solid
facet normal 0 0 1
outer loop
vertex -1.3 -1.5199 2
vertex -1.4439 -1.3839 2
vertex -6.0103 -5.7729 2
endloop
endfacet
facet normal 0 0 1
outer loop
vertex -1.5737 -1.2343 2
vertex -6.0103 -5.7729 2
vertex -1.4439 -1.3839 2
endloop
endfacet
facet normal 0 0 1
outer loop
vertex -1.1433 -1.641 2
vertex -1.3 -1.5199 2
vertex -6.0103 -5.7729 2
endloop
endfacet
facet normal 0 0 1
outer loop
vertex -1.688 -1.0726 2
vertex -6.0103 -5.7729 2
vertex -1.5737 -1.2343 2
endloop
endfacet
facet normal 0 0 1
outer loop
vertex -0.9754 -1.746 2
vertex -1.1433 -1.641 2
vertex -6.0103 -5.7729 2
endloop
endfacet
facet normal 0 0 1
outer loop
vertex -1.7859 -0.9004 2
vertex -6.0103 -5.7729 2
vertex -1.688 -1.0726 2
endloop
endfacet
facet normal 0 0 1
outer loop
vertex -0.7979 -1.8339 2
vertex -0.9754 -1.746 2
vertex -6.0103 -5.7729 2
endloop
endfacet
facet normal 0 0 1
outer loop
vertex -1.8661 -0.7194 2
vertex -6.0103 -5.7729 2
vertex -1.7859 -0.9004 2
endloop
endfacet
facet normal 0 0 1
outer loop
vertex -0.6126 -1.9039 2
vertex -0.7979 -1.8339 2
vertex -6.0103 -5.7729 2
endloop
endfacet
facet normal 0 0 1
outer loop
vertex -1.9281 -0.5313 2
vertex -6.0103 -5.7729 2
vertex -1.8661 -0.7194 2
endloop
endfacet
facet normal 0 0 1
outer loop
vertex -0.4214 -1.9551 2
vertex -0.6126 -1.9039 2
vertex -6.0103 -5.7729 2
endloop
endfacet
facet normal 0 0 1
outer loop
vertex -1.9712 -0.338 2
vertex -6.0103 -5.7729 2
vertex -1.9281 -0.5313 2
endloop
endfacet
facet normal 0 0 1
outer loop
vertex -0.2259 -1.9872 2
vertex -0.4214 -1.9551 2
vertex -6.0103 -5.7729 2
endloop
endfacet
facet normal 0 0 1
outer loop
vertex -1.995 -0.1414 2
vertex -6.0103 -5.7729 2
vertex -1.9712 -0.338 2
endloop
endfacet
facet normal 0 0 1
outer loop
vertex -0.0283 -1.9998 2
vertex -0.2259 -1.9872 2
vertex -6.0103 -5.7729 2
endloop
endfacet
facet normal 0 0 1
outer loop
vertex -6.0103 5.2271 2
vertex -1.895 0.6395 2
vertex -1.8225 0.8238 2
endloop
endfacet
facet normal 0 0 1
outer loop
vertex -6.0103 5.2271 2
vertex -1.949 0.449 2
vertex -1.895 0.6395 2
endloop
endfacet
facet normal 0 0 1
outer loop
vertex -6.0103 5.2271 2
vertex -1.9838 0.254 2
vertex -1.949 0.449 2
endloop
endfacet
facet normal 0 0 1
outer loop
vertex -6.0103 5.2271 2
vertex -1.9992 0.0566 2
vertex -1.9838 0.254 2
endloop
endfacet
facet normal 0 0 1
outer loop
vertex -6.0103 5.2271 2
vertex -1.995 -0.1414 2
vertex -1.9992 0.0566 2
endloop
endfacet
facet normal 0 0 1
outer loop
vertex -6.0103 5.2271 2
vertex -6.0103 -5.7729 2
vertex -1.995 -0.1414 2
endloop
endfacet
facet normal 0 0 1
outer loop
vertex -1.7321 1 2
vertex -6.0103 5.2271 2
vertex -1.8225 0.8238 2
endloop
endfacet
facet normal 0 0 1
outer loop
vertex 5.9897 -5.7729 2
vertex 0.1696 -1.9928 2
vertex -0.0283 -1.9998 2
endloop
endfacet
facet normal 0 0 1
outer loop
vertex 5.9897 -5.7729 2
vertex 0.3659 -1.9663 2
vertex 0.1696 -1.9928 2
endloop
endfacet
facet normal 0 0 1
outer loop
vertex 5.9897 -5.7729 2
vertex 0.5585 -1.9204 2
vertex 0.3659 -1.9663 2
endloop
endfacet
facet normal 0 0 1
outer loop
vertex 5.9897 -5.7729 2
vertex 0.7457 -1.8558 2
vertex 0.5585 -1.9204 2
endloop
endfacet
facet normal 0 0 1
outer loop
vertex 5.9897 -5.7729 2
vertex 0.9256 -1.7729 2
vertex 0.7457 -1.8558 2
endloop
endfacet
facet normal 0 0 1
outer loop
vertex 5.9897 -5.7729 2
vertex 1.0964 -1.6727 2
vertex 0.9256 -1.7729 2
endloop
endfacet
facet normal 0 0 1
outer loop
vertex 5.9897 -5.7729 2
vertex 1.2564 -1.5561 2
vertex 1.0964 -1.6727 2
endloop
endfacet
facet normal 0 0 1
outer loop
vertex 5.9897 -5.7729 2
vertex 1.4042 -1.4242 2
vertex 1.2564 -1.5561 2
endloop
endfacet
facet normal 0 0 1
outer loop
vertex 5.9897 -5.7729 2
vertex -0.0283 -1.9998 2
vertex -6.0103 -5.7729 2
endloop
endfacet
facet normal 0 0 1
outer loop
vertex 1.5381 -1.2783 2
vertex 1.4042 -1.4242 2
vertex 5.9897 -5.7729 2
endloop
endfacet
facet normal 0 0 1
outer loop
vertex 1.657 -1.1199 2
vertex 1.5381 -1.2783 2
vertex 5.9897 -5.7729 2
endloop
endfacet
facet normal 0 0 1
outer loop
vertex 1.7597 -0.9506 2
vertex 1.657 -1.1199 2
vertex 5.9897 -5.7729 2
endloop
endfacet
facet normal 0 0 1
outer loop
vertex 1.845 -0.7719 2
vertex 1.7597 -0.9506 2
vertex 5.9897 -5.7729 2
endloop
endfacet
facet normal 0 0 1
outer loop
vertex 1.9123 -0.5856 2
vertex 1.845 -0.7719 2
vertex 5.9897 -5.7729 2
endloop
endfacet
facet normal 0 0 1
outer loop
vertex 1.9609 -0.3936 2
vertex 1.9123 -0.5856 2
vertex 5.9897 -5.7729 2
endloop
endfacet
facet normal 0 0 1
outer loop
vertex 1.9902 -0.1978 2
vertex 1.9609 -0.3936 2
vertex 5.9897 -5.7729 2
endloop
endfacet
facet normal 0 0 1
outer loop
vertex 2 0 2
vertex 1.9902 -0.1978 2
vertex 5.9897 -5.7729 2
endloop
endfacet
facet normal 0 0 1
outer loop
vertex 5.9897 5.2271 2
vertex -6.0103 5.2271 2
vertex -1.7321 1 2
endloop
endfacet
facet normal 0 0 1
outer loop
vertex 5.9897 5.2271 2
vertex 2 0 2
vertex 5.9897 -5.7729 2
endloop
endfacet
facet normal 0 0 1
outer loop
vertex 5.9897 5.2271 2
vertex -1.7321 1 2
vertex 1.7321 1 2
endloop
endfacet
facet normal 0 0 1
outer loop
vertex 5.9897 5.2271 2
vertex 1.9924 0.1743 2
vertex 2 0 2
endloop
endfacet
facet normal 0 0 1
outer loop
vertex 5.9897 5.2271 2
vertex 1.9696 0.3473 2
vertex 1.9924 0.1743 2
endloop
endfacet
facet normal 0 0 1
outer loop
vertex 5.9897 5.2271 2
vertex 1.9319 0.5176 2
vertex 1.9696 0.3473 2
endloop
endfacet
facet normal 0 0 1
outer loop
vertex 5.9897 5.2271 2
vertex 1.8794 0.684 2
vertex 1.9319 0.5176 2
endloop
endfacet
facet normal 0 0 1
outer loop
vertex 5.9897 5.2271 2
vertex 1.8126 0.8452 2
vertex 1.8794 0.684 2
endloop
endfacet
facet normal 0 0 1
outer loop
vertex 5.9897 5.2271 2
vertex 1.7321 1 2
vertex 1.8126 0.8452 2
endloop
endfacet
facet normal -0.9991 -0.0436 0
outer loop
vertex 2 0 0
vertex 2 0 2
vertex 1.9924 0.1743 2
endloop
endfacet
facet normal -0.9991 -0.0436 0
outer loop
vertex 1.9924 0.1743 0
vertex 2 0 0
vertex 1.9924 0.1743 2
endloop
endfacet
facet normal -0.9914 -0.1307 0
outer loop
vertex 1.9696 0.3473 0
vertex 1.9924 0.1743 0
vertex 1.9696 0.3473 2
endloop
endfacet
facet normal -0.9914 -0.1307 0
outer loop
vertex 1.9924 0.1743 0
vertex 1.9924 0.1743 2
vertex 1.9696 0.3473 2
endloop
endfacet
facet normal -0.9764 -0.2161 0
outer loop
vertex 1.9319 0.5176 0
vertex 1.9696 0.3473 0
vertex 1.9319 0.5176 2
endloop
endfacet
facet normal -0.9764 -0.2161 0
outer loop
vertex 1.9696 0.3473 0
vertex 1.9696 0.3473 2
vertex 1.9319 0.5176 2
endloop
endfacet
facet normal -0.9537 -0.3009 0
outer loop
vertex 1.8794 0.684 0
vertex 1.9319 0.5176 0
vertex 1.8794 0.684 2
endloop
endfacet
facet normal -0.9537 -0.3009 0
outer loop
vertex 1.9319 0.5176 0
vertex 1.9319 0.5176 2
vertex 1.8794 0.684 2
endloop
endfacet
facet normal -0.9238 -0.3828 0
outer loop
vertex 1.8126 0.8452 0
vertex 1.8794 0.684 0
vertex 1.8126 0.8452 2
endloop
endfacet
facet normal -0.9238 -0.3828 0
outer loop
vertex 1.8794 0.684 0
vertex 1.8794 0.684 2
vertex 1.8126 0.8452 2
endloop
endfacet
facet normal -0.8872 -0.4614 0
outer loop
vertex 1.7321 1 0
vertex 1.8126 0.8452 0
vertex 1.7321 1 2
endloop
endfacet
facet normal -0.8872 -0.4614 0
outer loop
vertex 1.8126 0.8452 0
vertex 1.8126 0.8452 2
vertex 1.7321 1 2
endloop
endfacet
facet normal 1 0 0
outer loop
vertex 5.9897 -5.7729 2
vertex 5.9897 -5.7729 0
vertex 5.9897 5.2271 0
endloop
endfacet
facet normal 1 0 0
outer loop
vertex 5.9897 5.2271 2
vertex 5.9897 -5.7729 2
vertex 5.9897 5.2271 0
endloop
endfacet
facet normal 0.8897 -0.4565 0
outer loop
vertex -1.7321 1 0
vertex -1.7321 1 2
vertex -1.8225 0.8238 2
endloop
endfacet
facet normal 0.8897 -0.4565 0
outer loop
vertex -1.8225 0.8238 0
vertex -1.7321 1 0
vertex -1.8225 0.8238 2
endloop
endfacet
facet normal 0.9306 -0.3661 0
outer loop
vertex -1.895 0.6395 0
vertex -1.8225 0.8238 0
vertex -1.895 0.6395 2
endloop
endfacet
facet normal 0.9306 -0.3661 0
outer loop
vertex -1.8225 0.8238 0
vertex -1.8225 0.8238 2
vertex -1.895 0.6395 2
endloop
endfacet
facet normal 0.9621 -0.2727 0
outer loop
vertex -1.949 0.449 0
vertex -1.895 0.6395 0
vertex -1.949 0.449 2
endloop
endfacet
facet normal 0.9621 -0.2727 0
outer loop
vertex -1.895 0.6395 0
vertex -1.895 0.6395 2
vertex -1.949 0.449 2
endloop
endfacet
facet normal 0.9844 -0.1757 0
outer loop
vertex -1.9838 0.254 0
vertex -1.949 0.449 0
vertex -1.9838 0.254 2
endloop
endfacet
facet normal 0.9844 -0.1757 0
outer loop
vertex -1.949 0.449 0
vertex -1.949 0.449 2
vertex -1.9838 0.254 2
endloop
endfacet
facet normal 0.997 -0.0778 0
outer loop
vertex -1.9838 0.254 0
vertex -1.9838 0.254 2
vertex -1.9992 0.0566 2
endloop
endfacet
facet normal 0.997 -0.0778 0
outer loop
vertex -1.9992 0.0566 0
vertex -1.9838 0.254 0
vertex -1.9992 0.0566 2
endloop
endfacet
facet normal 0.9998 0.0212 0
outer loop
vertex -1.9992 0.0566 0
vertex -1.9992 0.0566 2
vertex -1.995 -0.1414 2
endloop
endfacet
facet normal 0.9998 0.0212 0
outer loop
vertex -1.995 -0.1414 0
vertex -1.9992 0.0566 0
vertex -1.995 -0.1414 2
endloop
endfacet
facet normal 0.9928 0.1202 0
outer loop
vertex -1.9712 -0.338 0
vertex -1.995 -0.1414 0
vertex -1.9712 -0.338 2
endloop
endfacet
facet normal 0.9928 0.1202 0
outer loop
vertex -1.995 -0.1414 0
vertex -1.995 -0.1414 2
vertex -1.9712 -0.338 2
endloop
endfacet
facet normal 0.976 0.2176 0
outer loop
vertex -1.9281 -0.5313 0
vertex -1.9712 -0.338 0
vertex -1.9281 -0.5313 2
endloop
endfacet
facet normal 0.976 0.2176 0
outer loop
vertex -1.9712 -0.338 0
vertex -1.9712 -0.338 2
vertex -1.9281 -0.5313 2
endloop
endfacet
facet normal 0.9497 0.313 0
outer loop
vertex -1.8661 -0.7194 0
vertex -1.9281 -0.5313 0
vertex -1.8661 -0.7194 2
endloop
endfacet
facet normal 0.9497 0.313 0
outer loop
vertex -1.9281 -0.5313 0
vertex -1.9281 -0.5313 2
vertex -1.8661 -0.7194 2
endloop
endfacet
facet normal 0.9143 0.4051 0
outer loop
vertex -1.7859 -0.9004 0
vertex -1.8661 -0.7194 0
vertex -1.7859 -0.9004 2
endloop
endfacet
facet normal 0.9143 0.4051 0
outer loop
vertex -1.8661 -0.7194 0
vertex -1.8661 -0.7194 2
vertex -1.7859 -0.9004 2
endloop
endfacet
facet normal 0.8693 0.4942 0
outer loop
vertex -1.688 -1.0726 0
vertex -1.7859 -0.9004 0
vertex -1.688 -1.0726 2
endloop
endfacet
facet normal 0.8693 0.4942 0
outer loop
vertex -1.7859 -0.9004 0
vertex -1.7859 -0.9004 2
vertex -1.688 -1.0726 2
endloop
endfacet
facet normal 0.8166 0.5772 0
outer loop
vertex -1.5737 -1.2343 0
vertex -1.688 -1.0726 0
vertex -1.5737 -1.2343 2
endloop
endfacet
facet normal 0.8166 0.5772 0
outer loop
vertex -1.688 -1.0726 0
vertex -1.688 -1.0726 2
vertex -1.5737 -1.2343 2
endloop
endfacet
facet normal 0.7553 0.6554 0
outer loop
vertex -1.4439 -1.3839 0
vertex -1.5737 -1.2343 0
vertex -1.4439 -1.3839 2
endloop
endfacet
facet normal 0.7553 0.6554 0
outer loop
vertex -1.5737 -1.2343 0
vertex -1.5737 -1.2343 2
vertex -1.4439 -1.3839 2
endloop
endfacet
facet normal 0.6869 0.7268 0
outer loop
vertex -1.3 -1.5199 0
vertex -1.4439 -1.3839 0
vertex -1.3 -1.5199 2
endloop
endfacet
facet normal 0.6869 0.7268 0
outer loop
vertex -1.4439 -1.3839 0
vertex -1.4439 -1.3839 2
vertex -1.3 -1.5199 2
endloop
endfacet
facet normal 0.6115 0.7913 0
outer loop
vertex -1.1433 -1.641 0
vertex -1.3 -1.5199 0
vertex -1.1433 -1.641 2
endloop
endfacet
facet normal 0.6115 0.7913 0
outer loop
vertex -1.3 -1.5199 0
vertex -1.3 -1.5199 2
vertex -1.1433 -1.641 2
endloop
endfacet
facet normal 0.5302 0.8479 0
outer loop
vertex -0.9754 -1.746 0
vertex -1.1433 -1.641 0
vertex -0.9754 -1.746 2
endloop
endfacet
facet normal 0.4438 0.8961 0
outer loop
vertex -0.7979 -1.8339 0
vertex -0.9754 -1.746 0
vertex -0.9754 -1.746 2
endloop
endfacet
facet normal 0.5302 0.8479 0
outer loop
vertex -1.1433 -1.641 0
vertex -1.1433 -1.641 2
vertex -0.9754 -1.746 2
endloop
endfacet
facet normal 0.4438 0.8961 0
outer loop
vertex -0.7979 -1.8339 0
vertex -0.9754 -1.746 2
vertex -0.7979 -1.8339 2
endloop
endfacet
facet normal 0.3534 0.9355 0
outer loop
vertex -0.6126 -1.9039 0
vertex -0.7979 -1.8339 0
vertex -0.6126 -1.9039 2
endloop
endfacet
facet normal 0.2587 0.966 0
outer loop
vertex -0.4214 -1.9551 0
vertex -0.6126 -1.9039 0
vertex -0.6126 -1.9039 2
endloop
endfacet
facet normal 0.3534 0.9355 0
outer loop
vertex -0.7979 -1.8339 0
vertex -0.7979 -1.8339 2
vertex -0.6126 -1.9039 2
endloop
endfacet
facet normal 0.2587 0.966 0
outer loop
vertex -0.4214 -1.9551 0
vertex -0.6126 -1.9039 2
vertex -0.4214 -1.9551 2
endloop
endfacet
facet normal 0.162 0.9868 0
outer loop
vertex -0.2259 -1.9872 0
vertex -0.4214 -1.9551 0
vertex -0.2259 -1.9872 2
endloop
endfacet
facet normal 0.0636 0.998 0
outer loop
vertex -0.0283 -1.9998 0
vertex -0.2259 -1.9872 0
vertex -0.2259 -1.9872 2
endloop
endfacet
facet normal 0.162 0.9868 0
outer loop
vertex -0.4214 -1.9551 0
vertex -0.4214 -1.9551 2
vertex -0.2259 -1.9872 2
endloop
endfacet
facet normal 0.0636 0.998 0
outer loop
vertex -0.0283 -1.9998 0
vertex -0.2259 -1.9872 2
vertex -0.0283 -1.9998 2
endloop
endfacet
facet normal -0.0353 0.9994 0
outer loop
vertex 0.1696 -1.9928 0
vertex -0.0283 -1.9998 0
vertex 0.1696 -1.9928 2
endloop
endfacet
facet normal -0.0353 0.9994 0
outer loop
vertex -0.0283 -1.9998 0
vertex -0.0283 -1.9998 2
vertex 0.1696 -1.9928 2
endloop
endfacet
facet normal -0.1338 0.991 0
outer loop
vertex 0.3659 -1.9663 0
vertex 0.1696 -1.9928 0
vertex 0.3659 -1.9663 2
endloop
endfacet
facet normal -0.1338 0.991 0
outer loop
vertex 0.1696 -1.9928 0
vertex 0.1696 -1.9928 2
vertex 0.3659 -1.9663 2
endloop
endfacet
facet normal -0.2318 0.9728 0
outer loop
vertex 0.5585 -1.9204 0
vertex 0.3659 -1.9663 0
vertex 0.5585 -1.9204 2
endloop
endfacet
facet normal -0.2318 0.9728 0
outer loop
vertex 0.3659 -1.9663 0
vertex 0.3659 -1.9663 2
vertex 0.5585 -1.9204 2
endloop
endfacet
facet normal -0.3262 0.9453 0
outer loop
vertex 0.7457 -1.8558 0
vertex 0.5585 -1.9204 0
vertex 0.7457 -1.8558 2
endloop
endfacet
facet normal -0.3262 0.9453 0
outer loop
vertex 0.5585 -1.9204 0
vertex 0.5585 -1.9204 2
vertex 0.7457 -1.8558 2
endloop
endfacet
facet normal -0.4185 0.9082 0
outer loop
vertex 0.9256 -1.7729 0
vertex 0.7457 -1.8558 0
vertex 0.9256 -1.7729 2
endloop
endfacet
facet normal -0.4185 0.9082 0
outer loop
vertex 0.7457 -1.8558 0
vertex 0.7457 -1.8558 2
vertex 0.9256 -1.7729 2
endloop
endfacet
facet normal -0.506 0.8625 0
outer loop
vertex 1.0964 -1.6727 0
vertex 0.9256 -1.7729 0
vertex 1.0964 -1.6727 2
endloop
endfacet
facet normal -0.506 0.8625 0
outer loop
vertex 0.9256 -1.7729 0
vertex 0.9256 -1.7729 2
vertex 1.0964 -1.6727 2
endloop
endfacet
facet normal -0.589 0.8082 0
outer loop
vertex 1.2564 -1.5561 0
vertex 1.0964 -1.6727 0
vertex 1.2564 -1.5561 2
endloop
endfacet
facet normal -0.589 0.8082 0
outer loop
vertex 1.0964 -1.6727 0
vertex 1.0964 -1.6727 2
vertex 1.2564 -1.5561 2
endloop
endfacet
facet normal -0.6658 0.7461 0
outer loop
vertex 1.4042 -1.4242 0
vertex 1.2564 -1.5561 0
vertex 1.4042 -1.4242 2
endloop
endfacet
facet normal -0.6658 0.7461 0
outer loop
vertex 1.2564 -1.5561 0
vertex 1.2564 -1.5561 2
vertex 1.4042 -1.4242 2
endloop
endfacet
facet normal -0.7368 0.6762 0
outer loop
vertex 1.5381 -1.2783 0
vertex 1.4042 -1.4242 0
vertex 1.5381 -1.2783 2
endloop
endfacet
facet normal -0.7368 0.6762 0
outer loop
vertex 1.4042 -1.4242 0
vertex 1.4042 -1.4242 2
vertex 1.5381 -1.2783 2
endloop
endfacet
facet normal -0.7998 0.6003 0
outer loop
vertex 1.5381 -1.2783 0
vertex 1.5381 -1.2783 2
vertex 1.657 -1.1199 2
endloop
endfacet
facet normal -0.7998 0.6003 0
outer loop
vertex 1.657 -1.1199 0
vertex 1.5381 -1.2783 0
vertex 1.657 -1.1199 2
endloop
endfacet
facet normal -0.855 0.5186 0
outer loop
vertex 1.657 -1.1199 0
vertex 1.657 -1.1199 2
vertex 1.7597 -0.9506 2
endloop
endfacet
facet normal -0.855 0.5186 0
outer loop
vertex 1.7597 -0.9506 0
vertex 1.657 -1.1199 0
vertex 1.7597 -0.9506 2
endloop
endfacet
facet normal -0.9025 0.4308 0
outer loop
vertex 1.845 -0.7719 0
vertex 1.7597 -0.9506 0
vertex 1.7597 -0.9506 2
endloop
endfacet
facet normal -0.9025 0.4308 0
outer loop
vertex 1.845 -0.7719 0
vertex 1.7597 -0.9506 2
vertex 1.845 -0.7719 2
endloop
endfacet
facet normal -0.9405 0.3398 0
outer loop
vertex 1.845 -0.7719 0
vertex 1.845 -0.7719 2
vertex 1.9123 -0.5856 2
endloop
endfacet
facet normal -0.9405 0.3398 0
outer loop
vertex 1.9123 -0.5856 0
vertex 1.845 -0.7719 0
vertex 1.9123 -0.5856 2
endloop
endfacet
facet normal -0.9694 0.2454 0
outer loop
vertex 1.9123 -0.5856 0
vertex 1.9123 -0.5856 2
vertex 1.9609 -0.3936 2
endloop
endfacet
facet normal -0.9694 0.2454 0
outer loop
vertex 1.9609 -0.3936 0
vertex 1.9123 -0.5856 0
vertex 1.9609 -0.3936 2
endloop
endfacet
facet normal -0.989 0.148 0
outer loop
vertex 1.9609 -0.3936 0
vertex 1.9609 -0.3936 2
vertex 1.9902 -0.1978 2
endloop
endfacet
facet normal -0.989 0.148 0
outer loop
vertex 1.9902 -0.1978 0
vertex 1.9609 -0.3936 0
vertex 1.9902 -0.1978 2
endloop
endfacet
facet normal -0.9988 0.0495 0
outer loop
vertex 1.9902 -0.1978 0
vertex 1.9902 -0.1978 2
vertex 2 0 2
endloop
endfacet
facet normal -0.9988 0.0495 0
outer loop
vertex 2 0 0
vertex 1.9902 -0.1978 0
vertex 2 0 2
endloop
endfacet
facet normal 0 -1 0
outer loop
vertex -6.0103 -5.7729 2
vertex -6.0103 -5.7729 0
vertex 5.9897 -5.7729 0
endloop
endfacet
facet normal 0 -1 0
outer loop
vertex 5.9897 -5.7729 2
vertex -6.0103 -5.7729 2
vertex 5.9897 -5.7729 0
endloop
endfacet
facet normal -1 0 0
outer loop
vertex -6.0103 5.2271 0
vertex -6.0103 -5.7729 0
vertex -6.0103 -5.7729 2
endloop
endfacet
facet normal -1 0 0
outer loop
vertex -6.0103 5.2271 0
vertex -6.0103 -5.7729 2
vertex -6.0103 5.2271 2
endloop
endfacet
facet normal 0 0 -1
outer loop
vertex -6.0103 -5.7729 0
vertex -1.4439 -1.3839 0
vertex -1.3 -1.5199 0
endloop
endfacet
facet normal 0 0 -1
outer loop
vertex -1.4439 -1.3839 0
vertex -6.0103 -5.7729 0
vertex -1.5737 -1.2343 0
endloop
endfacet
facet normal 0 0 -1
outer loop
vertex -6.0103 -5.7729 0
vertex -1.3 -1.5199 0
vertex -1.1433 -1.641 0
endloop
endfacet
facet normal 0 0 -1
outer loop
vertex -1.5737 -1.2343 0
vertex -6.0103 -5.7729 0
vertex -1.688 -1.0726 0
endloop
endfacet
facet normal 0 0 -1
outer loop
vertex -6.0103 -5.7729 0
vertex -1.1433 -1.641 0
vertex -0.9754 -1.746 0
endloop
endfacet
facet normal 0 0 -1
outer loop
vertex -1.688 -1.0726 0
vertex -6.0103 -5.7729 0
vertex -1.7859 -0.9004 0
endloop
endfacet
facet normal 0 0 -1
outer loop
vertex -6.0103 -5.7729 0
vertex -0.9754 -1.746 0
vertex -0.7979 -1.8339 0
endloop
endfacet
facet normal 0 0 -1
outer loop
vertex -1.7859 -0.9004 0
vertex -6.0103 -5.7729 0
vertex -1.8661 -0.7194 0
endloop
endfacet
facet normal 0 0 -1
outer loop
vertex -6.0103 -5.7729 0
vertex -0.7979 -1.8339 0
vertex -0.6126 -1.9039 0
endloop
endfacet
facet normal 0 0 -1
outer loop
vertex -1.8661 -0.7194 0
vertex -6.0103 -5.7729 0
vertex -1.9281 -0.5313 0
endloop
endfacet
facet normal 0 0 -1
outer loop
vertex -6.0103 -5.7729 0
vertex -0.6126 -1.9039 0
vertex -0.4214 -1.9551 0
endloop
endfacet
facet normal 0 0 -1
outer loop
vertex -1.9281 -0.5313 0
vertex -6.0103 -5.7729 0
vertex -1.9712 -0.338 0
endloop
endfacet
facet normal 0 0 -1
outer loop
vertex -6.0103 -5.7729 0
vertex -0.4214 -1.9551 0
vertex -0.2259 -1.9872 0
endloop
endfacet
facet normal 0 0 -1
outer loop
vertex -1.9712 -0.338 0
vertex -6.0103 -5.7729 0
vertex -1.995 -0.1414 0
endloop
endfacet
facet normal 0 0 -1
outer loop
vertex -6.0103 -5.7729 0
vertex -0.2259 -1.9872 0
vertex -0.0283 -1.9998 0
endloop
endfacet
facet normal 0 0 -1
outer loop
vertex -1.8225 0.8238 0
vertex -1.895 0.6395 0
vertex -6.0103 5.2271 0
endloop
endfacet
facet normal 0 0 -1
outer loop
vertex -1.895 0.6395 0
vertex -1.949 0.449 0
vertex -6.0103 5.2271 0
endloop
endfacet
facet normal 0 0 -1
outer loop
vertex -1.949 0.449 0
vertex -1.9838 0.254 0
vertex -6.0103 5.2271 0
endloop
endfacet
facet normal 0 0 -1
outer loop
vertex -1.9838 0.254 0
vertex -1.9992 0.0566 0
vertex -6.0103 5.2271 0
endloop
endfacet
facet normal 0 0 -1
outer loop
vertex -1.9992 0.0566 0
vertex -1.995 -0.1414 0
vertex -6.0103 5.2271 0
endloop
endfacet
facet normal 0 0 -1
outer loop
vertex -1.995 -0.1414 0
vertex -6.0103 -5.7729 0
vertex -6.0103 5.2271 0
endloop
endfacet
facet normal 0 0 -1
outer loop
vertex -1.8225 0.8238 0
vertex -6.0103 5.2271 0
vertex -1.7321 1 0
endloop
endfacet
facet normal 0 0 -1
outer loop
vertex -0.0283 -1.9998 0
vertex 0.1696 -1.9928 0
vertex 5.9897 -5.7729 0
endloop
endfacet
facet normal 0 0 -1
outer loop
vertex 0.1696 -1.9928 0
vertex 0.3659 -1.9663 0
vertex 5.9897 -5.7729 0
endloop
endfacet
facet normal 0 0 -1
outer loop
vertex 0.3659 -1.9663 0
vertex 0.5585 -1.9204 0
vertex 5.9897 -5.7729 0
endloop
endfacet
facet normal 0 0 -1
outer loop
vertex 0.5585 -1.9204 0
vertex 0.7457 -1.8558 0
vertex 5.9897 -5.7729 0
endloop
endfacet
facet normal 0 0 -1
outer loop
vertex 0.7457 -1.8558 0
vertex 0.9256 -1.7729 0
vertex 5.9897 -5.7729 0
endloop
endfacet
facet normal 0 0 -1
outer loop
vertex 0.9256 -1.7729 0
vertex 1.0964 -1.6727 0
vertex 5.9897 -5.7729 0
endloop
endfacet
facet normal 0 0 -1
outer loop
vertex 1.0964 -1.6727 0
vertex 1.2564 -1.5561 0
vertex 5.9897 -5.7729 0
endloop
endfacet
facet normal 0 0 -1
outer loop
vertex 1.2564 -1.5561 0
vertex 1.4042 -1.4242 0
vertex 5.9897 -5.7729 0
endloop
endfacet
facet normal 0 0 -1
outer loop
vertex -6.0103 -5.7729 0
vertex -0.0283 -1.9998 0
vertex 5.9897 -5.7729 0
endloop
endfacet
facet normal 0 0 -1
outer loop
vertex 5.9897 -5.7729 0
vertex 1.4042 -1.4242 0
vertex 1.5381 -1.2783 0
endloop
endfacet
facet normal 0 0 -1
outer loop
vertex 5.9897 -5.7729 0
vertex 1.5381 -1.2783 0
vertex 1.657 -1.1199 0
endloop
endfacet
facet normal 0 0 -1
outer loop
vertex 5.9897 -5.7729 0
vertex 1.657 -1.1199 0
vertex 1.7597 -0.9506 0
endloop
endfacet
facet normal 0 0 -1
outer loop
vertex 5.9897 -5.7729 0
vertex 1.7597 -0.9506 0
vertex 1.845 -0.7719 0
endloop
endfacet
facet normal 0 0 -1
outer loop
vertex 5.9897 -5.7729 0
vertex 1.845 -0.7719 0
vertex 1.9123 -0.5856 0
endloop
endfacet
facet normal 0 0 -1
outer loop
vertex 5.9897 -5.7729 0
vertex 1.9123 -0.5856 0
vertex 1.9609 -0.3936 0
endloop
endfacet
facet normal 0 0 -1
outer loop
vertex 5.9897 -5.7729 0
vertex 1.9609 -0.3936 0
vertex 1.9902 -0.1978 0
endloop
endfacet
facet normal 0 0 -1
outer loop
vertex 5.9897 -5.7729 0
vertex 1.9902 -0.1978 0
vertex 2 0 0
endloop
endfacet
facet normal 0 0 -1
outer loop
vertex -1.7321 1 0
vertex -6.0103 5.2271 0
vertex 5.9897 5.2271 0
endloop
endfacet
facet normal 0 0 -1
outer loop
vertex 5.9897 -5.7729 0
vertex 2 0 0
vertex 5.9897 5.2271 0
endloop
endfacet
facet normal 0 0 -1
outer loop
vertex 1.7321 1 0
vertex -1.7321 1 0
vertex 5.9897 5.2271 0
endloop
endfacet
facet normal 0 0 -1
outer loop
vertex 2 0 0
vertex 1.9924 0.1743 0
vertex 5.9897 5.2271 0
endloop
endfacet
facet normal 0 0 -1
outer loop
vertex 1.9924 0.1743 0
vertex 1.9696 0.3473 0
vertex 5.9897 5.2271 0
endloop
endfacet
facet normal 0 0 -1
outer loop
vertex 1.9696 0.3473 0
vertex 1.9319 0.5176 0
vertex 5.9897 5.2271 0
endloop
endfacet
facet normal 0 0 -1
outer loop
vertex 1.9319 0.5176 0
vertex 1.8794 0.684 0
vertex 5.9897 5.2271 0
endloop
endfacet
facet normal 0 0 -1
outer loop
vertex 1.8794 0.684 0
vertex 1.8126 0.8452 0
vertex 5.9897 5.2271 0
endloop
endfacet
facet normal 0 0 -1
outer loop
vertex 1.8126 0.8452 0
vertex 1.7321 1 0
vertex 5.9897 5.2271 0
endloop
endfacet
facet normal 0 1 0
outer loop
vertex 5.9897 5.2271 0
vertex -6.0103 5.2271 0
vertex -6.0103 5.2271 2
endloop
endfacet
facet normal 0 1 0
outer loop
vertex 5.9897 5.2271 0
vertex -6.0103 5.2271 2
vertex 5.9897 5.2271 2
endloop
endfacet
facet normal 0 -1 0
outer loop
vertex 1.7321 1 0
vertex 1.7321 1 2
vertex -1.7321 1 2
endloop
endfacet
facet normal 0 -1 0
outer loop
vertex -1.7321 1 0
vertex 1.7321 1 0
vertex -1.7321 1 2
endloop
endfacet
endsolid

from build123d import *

# Parameters (mm, degrees)
SKETCH_1_W          = 12
SKETCH_1_H          = 11
EXTRUDE_1_DEPTH     = 2
CUT_EXTRUDE_2_DEPTH = 2


with BuildPart() as part:
    # 草图1 → 凸台-拉伸1 (new body)
    with BuildSketch(Plane.XY):
        with Locations((-0.010267275, -0.272881356)):
            Rectangle(SKETCH_1_W, SKETCH_1_H)
    extrude(amount=EXTRUDE_1_DEPTH)

    # 草图2 → 切除-拉伸2 (cut)
    with BuildSketch(Plane.XY.offset(2)):
        with BuildLine():
            Line((0, 1), (-1.732050808, 1))
            ThreePointArc((-1.732050808, 1), (-0.51763809, -1.931851653), (2, 0))
            ThreePointArc((2, 0), (1.931851653, 0.51763809), (1.732050808, 1))
            Line((1.732050808, 1), (0, 1))
        make_face()
    extrude(amount=-CUT_EXTRUDE_2_DEPTH, mode=Mode.SUBTRACT)


solid = part.part
